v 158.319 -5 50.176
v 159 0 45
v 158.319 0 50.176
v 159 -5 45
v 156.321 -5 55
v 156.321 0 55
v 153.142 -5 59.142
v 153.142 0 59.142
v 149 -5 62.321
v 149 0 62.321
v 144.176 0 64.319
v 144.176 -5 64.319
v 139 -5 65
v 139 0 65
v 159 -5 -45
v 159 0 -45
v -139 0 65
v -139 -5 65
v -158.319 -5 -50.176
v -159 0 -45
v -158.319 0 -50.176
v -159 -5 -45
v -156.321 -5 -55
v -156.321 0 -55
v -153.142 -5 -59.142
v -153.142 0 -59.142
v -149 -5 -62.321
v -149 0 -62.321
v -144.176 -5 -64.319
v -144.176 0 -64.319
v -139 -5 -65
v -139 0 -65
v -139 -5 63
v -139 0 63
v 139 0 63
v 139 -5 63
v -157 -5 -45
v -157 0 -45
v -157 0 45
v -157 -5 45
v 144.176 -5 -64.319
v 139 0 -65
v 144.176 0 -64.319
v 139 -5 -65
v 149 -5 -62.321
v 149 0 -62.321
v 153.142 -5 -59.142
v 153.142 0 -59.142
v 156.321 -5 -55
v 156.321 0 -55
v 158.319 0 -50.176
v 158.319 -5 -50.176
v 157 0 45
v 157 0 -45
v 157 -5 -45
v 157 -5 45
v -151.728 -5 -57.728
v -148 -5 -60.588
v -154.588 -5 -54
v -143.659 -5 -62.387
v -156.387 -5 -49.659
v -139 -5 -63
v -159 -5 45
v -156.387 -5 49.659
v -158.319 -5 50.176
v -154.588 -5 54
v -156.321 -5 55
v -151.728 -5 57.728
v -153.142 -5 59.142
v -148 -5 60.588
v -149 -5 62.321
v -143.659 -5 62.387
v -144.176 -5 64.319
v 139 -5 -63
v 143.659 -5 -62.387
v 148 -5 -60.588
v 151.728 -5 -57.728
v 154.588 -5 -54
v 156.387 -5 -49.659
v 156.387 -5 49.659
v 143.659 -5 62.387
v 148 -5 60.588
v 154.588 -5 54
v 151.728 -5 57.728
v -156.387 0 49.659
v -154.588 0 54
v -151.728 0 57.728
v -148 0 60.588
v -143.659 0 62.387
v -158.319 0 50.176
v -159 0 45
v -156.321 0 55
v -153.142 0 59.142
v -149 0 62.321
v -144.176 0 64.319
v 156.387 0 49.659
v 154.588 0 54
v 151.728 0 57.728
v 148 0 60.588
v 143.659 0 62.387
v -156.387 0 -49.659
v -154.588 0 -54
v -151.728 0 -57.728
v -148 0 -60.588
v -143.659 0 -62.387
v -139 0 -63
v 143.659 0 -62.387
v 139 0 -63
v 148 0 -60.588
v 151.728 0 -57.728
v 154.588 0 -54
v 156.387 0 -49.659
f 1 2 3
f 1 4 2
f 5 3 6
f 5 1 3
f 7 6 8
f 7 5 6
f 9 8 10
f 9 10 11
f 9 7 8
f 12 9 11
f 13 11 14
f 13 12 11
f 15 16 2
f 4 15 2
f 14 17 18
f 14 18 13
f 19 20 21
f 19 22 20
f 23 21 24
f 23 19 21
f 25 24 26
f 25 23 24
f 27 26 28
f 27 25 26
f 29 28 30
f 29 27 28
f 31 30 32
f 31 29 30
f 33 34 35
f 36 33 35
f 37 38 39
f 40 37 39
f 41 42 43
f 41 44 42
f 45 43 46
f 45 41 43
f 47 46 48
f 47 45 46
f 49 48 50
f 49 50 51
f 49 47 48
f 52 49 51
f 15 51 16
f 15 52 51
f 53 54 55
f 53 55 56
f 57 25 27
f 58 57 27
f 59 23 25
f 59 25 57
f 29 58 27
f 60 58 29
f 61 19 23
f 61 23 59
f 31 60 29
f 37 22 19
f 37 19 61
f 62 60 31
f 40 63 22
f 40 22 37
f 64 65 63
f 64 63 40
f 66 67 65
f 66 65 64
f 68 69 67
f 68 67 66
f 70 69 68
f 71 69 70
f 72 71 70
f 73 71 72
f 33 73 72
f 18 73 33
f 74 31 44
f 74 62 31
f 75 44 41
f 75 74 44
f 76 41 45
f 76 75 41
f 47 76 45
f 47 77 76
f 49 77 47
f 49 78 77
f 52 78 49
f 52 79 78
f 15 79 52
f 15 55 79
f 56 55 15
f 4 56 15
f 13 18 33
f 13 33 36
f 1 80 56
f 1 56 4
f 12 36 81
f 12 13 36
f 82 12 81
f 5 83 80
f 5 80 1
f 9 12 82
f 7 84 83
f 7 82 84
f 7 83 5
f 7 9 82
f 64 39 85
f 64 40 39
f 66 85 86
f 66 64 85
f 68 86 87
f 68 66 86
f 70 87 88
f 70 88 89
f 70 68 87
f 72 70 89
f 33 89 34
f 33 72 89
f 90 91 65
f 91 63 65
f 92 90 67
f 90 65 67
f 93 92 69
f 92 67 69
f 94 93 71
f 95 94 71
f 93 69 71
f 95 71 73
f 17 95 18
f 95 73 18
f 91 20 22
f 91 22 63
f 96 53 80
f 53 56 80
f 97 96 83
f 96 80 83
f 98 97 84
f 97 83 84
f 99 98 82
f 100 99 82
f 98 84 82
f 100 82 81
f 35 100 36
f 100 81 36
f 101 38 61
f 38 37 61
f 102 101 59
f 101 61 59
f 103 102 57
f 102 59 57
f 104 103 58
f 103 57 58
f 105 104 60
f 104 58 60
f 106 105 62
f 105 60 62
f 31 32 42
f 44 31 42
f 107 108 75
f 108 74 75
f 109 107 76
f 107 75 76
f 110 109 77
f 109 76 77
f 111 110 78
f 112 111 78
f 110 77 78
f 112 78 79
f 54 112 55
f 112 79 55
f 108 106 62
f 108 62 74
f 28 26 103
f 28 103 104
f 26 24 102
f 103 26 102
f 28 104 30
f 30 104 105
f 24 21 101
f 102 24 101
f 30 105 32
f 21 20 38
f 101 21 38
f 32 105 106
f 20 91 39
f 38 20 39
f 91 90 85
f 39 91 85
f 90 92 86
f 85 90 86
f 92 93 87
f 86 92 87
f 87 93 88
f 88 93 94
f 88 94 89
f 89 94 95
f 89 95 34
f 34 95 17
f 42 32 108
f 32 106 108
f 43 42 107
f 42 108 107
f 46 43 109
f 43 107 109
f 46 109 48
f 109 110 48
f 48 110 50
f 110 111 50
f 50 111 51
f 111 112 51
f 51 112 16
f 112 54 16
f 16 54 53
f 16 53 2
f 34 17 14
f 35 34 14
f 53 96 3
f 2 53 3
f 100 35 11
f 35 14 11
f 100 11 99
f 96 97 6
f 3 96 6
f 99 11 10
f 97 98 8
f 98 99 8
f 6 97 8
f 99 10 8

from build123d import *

# Parameters (mm, degrees)
F0_W     = 318
F0_H     = 130
F1_DEPTH = 5
F2_R     = 20
F3_T     = -2


with BuildPart() as f1:
    # F0 (on Front) → F1 (new body)
    with BuildSketch(Plane.XZ):
        Rectangle(F0_W, F0_H)
    extrude(amount=F1_DEPTH)

    # F2
    f2_edges = [f1.edges().sort_by_distance(p)[0] for p in [
        (-159, -2.5, -65),
        (159, -2.5, -65),
        (159, -2.5, 65),
        (-159, -2.5, 65),
    ]]
    fillet(f2_edges, radius=F2_R)

    # F3
    f3_openings = [f1.faces().sort_by_distance(p)[0] for p in [
        (0, -5, 0),
        (0, 0, 0),
    ]]
    offset(amount=F3_T, openings=f3_openings)


solid = f1.part
